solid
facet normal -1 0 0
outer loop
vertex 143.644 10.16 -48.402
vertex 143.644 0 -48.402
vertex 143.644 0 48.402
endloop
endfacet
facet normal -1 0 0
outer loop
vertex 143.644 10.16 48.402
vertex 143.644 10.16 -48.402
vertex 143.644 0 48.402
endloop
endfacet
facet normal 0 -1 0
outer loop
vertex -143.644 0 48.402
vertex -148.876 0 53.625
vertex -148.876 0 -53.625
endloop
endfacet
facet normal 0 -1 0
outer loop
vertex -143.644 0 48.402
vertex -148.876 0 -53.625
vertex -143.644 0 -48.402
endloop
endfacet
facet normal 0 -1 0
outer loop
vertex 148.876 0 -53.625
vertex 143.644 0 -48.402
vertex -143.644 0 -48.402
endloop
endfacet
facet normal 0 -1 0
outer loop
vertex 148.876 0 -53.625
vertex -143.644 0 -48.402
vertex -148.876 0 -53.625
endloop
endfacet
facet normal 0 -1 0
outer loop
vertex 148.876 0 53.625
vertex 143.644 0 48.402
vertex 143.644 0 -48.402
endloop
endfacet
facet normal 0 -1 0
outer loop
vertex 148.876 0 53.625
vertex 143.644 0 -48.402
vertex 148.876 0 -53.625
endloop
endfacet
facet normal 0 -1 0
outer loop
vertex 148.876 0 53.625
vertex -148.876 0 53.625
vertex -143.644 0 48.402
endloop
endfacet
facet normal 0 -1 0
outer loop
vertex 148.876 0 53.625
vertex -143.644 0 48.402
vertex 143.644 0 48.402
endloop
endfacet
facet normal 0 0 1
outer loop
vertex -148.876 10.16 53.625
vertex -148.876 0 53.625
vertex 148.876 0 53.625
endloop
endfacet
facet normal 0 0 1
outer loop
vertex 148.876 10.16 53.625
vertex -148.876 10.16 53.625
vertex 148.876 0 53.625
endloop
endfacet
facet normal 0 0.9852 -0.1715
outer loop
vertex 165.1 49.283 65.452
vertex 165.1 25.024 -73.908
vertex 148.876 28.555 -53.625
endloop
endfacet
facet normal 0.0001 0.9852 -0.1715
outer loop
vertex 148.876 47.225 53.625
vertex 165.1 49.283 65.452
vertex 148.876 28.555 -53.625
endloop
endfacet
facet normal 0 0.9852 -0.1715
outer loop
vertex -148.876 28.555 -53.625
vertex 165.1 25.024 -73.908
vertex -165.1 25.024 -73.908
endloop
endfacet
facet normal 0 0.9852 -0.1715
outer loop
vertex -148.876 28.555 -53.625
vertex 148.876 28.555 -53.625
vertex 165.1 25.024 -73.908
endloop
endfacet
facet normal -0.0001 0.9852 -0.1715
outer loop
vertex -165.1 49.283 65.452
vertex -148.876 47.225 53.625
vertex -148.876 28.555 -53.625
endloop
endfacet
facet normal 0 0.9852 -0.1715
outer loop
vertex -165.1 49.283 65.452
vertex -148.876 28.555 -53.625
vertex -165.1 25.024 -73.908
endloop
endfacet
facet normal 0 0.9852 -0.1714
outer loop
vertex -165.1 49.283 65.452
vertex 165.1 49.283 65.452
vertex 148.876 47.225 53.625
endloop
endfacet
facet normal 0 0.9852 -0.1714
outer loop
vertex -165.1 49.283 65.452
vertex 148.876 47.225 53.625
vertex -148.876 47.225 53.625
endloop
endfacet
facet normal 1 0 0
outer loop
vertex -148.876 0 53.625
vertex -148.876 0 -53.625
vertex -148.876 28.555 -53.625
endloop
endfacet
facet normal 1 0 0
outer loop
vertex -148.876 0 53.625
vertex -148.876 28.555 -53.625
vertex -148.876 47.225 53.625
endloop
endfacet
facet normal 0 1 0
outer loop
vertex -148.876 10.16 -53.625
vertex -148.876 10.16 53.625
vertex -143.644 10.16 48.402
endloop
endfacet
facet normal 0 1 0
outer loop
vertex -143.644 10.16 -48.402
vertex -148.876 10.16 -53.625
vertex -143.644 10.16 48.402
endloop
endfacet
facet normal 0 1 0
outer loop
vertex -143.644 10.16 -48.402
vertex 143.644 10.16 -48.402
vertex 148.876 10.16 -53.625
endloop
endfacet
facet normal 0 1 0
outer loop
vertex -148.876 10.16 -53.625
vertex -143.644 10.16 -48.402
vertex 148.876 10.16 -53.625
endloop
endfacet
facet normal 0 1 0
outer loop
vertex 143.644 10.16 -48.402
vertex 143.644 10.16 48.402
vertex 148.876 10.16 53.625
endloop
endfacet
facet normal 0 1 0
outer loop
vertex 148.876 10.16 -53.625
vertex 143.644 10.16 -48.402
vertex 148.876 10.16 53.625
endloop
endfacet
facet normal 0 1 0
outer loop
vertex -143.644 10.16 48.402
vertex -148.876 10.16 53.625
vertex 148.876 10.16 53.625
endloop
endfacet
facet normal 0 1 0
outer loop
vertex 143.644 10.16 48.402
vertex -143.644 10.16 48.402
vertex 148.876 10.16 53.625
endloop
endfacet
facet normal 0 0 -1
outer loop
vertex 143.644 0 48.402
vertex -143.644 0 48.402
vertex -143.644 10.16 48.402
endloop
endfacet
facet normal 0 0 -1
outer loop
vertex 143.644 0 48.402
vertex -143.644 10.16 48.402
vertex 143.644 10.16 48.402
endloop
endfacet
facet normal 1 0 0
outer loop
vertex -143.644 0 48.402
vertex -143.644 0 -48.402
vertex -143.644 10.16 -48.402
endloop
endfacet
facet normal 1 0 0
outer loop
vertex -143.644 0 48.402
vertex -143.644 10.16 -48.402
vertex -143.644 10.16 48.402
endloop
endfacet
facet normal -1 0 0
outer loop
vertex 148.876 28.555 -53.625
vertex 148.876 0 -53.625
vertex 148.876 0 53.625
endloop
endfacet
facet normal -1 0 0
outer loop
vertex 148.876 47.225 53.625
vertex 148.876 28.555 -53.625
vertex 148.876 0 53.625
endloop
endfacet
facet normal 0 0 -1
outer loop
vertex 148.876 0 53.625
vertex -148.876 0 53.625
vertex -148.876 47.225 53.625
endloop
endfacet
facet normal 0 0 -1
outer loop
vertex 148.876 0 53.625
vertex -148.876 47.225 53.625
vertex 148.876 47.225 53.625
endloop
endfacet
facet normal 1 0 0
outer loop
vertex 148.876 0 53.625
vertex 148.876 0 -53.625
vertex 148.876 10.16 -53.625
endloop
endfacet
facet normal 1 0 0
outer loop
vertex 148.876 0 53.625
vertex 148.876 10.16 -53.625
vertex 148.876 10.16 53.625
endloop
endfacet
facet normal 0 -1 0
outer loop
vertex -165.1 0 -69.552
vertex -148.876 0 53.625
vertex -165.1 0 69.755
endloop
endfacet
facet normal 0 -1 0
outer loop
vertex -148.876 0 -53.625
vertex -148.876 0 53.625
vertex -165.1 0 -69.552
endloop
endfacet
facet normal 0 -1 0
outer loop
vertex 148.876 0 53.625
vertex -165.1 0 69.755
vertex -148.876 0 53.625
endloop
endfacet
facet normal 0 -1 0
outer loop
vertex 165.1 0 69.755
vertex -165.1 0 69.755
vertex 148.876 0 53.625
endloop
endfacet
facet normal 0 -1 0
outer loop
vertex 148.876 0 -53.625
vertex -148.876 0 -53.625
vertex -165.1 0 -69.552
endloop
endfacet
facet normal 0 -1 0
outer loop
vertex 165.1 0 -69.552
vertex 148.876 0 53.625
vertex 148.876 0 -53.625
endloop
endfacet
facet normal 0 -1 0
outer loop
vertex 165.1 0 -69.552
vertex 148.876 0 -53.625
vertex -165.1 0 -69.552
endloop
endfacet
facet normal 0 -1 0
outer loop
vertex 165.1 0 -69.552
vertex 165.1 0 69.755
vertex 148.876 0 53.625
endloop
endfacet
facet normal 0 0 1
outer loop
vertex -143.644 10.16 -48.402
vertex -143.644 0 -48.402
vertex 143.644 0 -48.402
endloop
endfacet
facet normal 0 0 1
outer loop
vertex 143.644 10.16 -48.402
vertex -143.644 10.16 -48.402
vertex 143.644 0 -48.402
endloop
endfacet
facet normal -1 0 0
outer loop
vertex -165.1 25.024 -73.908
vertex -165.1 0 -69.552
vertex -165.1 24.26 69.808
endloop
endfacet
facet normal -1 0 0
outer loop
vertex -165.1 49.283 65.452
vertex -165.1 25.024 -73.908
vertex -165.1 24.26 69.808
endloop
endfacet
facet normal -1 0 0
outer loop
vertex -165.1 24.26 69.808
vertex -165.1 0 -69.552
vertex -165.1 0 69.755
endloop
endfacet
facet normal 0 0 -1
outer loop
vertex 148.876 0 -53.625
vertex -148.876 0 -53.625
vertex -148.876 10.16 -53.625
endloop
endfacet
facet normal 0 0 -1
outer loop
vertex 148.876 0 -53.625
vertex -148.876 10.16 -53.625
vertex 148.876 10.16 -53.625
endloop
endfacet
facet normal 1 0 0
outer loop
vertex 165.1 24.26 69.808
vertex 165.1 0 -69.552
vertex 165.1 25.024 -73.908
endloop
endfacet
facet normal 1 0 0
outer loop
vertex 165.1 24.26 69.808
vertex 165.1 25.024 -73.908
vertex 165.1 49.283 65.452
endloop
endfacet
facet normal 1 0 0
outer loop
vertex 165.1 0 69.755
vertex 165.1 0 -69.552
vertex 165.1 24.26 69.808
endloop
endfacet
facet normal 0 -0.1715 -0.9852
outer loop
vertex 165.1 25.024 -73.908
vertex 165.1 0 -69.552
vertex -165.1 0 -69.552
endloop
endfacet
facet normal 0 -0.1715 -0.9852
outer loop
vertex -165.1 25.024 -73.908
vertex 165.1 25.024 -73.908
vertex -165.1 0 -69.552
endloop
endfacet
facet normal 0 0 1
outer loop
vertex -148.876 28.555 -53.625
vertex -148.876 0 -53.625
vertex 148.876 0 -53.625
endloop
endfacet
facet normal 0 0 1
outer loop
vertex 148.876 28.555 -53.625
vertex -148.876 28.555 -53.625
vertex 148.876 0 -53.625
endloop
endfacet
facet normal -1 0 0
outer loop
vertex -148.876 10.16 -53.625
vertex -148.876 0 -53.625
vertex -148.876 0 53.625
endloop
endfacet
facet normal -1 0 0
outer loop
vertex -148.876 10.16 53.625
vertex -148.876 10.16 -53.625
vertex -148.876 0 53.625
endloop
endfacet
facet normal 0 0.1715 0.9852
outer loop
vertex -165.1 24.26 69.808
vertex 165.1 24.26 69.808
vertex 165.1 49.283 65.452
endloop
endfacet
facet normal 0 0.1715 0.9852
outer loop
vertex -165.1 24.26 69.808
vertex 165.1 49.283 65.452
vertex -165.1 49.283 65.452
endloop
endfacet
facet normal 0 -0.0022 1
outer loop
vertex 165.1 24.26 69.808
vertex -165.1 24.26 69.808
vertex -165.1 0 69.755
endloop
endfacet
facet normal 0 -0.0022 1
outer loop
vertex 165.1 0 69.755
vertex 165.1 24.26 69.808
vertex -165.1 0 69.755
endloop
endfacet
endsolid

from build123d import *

# Parameters (mm, degrees)
F2_DEPTH      = 165.1
F2_DEPTH_BACK = 165.1
F3_W          = 330.2
F3_H          = 141.4554488717
F4_DEPTH      = 25.4
F0_W          = 297.7512968
F0_H          = 107.2502808
F0_W_2        = 287.2877287
F0_H_2        = 96.8048356
F5_DEPTH      = 49.284363677
F6_DEPTH      = 10.16
F7_DEPTH      = 49.284363677


with BuildPart() as f2:
    # F1 (on Right) → F2 (new body, two sides)
    with BuildSketch(Plane.YZ) as f2_sk:
        Polygon((0, 69.7549134493), (0, -69.5518404245), (24.2596895352, 69.807807534), align=None)
    extrude(amount=F2_DEPTH)
    extrude(f2_sk.sketch, amount=-F2_DEPTH_BACK)

    # F3 (on face) → F4 (join)
    with BuildSketch(Plane(origin=(0, 11.7514523339, -2.0456896195), x_dir=(-1, 0, 0), z_dir=(0, 0.9851840213, -0.1715005659))):
        with Locations((0, 2.2063625954)):
            Rectangle(F3_W, F3_H)
    extrude(amount=F4_DEPTH)

    # F0 (on Front) → F5 (cut, through all)
    with BuildSketch(Plane.XZ):
        Rectangle(F0_W, F0_H)
        Rectangle(F0_W_2, F0_H_2, mode=Mode.SUBTRACT)
    extrude(amount=-F5_DEPTH, mode=Mode.SUBTRACT)

    # F0 (on Front) → F7 (cut, through all)
    with BuildSketch(Plane.XZ):
        Rectangle(F0_W_2, F0_H_2)
    extrude(amount=-F7_DEPTH, mode=Mode.SUBTRACT)


with BuildPart() as f6:
    # F0 (on Front) → F6 (new body)
    with BuildSketch(Plane.XZ):
        Rectangle(F0_W, F0_H)
        Rectangle(F0_W_2, F0_H_2, mode=Mode.SUBTRACT)
    extrude(amount=-F6_DEPTH)


solid = Compound([f2.part, f6.part])
